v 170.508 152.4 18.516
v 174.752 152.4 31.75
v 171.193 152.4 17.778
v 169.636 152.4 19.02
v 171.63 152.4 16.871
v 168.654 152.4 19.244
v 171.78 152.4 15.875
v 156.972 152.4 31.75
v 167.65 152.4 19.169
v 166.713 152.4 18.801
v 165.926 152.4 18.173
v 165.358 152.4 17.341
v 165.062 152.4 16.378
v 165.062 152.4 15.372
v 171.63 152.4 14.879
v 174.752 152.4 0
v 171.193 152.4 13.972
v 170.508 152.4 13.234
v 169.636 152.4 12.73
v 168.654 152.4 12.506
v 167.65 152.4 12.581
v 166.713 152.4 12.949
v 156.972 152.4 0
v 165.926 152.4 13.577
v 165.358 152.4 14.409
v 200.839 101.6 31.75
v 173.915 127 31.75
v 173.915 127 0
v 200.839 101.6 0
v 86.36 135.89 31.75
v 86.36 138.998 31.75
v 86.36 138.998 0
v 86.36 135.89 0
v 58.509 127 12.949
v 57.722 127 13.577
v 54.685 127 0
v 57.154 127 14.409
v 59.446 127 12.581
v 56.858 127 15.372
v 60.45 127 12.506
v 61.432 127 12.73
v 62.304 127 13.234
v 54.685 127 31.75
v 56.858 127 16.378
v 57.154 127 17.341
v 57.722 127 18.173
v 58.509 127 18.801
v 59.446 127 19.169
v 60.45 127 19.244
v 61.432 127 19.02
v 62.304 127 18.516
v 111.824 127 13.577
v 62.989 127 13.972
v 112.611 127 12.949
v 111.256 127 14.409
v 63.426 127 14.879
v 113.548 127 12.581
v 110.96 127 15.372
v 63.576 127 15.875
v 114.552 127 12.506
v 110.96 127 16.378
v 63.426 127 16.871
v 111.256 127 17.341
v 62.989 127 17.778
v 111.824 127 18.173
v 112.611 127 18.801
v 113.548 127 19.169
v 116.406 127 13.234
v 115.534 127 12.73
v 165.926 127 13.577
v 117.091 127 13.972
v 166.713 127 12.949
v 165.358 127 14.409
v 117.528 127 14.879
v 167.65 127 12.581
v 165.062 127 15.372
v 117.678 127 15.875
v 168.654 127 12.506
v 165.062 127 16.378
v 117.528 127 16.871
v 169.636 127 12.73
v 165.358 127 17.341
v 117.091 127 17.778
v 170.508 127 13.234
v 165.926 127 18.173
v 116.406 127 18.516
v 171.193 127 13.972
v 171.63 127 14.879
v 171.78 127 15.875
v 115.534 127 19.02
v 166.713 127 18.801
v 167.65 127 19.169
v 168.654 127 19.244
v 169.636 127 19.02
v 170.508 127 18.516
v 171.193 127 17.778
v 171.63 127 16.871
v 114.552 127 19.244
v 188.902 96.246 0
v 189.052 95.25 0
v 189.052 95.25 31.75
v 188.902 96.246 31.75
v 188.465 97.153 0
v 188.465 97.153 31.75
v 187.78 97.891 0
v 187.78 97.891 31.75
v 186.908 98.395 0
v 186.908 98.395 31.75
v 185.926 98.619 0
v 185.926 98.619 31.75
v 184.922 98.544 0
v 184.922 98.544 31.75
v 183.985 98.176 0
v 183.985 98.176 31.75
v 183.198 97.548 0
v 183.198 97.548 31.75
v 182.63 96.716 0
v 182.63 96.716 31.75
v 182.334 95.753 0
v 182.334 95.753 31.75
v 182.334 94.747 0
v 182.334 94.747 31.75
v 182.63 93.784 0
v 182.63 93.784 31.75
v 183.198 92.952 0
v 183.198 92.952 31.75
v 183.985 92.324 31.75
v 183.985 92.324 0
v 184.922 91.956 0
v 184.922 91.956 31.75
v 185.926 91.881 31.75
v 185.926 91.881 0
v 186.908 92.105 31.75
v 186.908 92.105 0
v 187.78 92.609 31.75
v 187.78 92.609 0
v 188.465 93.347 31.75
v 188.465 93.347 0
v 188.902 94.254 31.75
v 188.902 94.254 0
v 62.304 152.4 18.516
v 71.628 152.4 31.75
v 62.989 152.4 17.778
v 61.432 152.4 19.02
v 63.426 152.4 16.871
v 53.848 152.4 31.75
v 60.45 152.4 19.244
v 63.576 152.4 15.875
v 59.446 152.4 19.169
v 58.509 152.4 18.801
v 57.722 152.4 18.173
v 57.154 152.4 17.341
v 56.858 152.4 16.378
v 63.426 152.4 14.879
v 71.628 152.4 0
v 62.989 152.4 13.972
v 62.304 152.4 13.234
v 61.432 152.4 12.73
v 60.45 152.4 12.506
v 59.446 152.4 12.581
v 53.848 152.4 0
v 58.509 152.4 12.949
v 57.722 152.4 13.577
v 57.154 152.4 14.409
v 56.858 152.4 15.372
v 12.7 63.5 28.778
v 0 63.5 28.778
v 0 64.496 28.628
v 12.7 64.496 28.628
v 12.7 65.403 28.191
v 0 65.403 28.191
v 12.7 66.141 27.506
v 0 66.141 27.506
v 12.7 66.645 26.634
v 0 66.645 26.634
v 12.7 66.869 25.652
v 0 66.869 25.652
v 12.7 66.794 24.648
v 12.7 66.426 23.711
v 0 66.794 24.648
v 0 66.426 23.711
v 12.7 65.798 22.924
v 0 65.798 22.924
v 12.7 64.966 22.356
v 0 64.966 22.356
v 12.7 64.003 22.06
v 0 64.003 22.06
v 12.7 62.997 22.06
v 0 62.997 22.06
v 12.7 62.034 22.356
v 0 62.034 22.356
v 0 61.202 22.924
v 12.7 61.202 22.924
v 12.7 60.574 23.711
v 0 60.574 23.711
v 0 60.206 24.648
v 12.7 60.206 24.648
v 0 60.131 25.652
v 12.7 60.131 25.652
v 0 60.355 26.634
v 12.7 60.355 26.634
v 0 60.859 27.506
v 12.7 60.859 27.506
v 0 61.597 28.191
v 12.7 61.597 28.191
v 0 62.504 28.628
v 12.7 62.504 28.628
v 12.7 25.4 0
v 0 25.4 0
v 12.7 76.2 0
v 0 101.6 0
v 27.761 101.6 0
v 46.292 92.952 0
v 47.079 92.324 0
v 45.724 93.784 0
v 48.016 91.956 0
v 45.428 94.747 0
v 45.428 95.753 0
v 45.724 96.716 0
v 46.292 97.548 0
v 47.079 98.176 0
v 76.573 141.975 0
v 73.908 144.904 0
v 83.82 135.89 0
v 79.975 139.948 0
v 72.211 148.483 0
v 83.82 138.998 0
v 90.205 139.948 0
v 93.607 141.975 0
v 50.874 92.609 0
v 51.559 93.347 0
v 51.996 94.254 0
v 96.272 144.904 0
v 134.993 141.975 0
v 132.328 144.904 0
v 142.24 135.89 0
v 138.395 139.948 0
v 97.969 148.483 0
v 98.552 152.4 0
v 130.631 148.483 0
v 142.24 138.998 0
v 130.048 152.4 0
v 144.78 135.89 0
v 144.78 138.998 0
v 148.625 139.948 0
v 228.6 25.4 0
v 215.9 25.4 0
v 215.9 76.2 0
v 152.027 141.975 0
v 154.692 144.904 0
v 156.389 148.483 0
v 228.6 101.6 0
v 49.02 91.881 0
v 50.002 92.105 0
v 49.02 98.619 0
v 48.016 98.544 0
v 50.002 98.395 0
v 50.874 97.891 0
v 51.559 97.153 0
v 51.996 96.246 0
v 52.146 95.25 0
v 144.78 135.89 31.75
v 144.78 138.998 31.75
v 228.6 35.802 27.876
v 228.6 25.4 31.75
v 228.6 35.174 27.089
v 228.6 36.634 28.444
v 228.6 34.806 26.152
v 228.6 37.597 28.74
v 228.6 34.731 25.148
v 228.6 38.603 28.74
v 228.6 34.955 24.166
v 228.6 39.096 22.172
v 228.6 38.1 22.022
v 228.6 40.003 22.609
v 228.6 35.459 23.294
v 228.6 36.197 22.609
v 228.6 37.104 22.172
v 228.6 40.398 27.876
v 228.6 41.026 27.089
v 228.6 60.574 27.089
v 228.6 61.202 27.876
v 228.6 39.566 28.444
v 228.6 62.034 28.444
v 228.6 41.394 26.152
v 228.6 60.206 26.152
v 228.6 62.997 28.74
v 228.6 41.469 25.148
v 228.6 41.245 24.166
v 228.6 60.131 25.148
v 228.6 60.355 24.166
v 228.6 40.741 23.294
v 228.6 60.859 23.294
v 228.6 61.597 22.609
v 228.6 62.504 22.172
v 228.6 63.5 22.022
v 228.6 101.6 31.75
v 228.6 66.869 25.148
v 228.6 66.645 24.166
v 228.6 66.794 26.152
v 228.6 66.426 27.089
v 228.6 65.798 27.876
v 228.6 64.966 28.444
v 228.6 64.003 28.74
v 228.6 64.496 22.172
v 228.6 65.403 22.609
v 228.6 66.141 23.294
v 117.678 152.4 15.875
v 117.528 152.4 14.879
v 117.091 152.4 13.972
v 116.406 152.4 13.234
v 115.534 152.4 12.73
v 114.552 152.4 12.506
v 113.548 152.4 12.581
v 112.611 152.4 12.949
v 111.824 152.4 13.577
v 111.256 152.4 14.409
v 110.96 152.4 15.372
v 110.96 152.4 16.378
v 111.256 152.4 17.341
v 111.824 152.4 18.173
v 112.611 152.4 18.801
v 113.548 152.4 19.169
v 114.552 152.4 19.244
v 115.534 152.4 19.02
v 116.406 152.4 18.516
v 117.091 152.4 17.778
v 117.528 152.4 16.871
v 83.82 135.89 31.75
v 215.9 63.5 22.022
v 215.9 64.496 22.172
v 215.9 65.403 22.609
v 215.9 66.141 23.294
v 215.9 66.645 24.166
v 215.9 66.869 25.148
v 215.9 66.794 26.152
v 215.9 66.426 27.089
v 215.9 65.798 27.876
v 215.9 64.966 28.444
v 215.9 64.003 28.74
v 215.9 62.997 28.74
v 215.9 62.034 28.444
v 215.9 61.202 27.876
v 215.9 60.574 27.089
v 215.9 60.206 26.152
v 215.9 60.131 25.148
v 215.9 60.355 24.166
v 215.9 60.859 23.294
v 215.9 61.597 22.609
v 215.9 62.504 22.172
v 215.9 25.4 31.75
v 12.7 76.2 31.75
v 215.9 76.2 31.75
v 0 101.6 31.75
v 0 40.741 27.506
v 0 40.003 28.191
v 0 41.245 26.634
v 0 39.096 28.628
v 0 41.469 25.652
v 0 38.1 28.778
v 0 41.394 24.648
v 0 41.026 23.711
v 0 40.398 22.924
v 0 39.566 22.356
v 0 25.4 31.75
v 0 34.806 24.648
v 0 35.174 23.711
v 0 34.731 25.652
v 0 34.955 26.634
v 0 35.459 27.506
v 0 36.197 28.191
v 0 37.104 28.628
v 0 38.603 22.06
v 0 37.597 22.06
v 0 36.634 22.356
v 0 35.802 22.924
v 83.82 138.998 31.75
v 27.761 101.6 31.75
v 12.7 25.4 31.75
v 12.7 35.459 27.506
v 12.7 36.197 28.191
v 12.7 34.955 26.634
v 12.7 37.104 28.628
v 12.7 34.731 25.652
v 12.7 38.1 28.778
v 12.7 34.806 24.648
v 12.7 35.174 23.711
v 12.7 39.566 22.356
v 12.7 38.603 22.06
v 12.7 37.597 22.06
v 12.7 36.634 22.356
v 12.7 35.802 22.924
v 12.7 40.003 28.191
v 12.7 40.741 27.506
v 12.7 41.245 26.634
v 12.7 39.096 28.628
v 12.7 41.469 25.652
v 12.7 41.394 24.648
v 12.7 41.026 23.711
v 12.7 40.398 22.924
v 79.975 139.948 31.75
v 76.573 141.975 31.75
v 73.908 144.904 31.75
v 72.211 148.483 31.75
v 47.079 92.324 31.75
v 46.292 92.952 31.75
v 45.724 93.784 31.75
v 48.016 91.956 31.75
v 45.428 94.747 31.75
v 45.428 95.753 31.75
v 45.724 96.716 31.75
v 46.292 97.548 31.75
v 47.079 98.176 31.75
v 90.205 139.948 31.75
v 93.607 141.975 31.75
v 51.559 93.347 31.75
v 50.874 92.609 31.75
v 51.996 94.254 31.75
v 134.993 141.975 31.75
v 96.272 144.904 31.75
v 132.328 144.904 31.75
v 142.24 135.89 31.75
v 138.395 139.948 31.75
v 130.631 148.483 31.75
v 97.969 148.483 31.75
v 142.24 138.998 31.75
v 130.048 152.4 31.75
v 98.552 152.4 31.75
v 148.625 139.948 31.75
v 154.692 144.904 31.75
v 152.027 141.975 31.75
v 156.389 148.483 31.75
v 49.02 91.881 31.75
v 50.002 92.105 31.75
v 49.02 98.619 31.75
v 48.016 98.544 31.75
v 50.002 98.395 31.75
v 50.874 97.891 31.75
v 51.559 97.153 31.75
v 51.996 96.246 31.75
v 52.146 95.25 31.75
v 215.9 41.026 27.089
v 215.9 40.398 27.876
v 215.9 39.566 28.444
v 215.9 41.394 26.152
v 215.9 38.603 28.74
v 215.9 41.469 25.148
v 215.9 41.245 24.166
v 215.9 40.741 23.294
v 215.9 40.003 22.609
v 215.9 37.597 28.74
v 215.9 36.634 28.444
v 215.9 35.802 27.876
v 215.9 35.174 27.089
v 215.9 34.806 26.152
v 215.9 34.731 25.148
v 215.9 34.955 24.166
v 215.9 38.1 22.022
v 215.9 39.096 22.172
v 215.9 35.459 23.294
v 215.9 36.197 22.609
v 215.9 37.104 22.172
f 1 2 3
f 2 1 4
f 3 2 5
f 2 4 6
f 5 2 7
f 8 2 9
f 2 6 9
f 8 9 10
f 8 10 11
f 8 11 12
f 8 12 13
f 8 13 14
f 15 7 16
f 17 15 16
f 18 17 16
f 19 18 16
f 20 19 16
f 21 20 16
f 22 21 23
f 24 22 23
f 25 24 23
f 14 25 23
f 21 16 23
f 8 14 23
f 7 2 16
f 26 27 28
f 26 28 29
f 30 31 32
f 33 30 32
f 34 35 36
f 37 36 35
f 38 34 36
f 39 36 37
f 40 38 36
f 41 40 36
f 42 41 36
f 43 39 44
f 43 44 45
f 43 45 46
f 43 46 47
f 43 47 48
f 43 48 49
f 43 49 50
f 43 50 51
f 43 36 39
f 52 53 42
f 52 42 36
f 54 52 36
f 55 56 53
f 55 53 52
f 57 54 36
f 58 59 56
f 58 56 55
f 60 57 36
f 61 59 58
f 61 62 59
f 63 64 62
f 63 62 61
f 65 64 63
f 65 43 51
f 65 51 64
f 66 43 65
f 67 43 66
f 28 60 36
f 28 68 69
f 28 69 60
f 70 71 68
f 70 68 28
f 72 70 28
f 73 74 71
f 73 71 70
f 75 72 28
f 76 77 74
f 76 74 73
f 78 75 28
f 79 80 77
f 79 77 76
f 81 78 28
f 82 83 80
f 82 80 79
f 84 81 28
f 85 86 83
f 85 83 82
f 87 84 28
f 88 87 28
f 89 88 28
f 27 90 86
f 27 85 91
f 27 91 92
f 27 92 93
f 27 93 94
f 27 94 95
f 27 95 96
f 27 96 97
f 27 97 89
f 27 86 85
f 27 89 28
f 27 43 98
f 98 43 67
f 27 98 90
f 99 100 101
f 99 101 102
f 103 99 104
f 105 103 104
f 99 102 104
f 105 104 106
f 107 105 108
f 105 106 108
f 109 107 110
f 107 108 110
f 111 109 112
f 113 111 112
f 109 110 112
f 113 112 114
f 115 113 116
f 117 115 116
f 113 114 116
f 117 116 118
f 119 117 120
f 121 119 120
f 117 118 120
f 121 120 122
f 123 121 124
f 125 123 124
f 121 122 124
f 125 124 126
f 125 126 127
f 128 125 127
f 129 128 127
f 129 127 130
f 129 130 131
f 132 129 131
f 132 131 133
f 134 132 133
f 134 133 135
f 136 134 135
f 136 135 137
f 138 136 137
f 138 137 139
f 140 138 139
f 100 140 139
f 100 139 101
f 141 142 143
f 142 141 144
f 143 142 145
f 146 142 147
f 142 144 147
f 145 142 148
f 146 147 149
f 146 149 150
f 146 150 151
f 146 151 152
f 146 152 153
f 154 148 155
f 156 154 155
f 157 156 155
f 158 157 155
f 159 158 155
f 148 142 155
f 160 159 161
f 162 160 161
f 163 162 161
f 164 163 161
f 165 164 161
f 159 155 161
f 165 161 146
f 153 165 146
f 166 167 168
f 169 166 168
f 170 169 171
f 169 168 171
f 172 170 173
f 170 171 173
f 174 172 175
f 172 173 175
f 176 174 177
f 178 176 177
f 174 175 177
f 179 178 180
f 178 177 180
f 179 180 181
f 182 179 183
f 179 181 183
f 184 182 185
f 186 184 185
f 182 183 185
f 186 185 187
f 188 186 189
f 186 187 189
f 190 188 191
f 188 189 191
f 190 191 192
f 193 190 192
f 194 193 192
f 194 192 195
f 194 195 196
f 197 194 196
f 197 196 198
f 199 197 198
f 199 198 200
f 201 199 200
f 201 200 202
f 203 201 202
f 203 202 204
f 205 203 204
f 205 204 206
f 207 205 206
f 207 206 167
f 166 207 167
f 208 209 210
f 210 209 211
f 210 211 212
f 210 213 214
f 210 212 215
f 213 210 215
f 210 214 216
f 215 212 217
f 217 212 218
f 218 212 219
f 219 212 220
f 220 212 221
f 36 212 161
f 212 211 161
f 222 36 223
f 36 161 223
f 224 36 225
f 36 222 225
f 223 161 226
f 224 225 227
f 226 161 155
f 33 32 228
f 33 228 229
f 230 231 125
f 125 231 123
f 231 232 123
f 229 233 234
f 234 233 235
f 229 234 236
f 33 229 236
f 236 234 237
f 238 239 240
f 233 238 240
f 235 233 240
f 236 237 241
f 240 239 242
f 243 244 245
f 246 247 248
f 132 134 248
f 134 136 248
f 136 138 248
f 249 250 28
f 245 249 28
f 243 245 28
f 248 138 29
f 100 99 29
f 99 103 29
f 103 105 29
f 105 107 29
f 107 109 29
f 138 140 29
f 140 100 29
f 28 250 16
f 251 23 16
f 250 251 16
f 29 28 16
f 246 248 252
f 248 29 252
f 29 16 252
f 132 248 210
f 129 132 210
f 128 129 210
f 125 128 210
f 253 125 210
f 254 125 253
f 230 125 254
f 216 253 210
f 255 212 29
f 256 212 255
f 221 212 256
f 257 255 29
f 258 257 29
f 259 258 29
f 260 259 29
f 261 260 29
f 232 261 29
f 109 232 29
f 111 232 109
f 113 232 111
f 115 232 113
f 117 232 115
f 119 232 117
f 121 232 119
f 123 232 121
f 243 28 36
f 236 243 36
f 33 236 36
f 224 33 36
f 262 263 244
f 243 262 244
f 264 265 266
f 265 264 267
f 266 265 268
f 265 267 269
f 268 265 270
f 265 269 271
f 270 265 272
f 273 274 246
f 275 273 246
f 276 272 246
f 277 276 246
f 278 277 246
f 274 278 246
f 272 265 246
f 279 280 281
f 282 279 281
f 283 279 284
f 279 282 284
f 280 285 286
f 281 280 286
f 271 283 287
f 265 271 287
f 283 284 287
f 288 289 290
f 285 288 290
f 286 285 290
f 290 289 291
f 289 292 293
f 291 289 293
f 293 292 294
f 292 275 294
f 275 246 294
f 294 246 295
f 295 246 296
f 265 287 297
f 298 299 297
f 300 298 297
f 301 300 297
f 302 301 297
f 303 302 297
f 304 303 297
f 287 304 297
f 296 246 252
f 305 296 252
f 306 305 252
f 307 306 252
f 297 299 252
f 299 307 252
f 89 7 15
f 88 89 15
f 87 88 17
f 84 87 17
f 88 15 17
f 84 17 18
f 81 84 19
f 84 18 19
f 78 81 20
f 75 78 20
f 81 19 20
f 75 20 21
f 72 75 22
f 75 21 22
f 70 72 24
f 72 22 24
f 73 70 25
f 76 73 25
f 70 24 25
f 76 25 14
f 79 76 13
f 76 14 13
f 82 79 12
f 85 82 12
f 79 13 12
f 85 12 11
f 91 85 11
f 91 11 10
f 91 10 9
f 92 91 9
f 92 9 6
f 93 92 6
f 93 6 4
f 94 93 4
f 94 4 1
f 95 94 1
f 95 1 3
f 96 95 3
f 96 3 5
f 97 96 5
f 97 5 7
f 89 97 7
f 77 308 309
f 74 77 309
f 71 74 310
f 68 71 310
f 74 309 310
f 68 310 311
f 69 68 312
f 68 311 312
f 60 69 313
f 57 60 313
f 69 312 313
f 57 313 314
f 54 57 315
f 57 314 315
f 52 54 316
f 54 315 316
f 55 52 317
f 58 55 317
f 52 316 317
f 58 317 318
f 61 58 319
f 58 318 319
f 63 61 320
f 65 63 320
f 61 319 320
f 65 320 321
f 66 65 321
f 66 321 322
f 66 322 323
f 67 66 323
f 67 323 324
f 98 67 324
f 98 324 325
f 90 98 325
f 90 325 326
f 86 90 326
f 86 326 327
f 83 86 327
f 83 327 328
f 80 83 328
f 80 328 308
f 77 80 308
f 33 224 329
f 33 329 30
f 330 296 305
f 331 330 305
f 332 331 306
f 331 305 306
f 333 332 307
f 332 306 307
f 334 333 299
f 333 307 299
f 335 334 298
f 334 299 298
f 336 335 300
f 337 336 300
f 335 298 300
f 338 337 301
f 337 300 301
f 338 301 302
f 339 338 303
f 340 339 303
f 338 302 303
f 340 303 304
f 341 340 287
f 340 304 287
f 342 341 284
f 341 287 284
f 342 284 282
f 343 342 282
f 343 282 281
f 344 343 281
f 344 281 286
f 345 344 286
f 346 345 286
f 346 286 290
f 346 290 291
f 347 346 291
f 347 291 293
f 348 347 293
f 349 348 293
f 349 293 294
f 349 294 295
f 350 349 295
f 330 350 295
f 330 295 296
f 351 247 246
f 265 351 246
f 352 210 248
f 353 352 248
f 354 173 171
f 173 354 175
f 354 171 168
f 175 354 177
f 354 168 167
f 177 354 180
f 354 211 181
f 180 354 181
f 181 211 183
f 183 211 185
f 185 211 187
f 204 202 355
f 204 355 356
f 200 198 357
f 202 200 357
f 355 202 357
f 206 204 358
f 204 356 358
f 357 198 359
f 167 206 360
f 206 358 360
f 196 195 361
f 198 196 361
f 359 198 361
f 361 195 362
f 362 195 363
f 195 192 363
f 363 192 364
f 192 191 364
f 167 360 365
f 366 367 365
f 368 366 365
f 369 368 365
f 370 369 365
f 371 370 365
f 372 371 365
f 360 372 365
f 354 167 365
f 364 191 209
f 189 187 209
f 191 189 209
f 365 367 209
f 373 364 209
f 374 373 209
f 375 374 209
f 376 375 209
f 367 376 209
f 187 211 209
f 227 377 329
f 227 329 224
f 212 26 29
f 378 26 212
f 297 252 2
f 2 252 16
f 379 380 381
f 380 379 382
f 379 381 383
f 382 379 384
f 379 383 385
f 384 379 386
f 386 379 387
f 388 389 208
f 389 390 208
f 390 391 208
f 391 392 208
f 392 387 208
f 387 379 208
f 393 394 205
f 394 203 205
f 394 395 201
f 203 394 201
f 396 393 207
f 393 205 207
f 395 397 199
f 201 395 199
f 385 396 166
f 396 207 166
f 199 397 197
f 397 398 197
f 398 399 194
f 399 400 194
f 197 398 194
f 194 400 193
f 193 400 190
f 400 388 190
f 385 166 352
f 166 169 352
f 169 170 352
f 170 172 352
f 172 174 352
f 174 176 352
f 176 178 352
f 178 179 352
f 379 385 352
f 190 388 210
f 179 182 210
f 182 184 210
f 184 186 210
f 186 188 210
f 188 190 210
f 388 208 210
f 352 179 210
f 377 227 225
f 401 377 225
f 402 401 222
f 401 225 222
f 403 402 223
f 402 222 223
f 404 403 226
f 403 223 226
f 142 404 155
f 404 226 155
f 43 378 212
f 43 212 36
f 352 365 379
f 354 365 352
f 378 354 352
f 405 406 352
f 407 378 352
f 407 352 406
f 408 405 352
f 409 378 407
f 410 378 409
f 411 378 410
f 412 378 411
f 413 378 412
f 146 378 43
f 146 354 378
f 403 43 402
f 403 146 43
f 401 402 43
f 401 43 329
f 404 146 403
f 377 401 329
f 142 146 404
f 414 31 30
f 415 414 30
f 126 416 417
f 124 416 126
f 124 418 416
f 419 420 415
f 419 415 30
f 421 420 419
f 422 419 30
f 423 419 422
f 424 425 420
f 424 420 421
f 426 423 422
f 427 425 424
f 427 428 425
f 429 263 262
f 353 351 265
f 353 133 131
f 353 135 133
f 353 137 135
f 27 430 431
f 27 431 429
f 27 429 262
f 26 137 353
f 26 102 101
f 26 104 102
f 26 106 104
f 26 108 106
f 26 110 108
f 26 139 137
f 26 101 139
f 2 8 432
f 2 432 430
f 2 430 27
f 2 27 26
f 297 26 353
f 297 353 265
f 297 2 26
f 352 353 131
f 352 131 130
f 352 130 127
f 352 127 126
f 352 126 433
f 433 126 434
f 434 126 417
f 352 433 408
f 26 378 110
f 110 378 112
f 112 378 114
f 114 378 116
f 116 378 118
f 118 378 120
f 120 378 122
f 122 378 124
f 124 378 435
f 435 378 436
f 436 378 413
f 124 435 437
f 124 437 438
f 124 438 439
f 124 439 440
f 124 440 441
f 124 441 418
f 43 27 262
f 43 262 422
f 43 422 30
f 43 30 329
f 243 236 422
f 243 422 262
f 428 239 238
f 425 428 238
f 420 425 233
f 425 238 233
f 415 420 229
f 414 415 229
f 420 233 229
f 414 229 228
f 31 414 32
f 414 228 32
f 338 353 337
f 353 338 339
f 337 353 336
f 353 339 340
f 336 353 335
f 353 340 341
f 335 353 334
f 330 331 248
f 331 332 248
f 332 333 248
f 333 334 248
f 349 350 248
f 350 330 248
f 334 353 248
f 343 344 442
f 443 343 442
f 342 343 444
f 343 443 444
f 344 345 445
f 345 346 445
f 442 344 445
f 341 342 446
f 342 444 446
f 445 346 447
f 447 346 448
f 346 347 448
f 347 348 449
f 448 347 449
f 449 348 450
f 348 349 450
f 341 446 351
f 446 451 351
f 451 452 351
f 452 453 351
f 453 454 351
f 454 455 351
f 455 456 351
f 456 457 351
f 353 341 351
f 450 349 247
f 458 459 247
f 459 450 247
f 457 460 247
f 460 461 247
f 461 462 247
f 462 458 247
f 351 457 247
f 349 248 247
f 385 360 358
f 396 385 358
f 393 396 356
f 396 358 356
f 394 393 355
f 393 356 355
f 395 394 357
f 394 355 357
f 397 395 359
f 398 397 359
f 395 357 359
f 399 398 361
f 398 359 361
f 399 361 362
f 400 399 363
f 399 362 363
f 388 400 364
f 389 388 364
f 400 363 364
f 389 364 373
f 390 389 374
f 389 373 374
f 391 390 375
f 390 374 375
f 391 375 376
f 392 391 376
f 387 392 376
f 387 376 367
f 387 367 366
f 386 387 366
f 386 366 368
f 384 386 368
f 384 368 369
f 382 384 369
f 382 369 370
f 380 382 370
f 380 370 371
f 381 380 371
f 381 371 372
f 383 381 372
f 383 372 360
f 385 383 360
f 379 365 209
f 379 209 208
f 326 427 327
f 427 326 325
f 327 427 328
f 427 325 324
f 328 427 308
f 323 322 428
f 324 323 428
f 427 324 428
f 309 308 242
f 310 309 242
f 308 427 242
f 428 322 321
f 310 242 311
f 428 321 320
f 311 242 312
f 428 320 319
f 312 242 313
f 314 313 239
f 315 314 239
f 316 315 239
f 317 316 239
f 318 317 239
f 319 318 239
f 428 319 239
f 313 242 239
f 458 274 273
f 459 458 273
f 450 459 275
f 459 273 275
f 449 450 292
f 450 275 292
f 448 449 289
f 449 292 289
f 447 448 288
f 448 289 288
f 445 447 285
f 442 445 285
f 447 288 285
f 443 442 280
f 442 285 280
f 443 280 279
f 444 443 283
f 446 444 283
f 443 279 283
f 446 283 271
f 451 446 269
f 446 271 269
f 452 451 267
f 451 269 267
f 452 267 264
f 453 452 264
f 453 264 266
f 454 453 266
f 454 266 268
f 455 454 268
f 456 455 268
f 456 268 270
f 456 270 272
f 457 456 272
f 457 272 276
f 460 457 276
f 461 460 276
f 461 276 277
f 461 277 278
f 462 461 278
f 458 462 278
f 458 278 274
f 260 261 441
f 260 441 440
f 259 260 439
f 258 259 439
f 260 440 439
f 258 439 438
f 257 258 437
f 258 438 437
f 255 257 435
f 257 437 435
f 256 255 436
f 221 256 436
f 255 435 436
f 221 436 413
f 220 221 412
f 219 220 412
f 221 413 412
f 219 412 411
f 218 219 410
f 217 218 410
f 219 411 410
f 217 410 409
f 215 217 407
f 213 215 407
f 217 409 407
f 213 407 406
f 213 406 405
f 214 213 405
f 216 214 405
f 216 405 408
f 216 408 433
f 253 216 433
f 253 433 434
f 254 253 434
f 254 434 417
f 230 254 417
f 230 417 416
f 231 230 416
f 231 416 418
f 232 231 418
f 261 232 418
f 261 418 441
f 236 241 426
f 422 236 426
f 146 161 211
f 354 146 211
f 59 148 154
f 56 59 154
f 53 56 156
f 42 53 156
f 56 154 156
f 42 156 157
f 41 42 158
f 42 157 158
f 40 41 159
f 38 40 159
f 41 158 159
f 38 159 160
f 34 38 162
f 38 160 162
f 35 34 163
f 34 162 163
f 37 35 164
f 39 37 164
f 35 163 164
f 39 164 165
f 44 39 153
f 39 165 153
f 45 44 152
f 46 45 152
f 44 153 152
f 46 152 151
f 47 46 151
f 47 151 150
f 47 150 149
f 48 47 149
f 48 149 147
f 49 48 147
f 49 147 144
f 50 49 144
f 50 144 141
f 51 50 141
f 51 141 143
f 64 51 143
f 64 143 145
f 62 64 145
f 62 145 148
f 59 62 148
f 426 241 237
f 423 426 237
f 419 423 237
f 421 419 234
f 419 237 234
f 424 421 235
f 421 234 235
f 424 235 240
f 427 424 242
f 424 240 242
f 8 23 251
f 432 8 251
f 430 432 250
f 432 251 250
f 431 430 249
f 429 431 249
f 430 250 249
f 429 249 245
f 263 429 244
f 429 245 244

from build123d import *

# Parameters (mm, degrees)
BOSS_EXTRUDE1_DEPTH = 50.8
SKETCH3_R           = 3.3782
CUT_EXTRUDE1_DEPTH  = 25.4
SKETCH4_R           = 3.3782
CUT_EXTRUDE2_DEPTH  = 25.4
SKETCH7_W           = 228.6
SKETCH7_H           = 152.4
CUT_EXTRUDE5_DEPTH  = 19.05
SKETCH8_W           = 228.6
SKETCH8_H           = 25.4
CUT_EXTRUDE6_DEPTH  = 39.37
SKETCH9_R           = 3.3782
CUT_EXTRUDE7_DEPTH  = 27.94
CUT_EXTRUDE8_DEPTH  = 40.64
SKETCH12_W          = 1.27
SKETCH12_H          = 31.75
CUT_EXTRUDE9_DEPTH  = 16.51
CUT_EXTRUDE10_REACH = 33.75
SKETCH13_R          = 3.3782


with BuildPart() as part:
    # Sketch2 → Boss-Extrude1 (new body)
    with BuildSketch(Plane.XY):
        with BuildLine():
            Line((215.9, 0), (228.6, 0))
            Line((228.6, 0), (228.6, 101.6))
            Line((228.6, 101.6), (174.752, 152.4))
            Line((174.752, 152.4), (156.972, 152.4))
            ThreePointArc((156.972, 152.4), (143.51, 138.938), (130.048, 152.4))
            Line((130.048, 152.4), (98.552, 152.4))
            ThreePointArc((98.552, 152.4), (85.09, 138.938), (71.628, 152.4))
            Line((71.628, 152.4), (53.848, 152.4))
            Line((53.848, 152.4), (0, 101.6))
            Line((0, 101.6), (0, 0))
            Line((0, 0), (12.7, 0))
            Line((12.7, 0), (12.7, 76.2))
            Line((12.7, 76.2), (215.9, 76.2))
            Line((215.9, 76.2), (215.9, 0))
        make_face()
    extrude(amount=BOSS_EXTRUDE1_DEPTH)

    # Sketch3 → Cut-Extrude1 (cut)
    with BuildSketch(Plane.ZY):
        with Locations((25.4, 63.5)):
            Circle(SKETCH3_R)
        with Locations((25.4, 38.1)):
            Circle(SKETCH3_R)
    extrude(amount=-CUT_EXTRUDE1_DEPTH, mode=Mode.SUBTRACT)

    # Sketch4 → Cut-Extrude2 (cut)
    with BuildSketch(Plane(origin=(228.6, 0, 0), x_dir=(0, 0, -1), z_dir=(1, 0, 0))):
        with Locations((-25.4, 63.5)):
            Circle(SKETCH4_R)
        with Locations((-25.4, 38.1)):
            Circle(SKETCH4_R)
    extrude(amount=-CUT_EXTRUDE2_DEPTH, mode=Mode.SUBTRACT)

    # Sketch7 → Cut-Extrude5 (cut)
    with BuildSketch(Plane.XY.offset(50.8)):
        with Locations((114.3, 76.2)):
            Rectangle(SKETCH7_W, SKETCH7_H)
    extrude(amount=-CUT_EXTRUDE5_DEPTH, mode=Mode.SUBTRACT)

    # Sketch8 → Cut-Extrude6 (cut)
    with BuildSketch(Plane.XY.offset(31.75)):
        with Locations((114.3, 12.7)):
            Rectangle(SKETCH8_W, SKETCH8_H)
    extrude(amount=-CUT_EXTRUDE6_DEPTH, mode=Mode.SUBTRACT)

    # Sketch9 → Cut-Extrude7 (cut)
    with BuildSketch(Plane(origin=(0, 152.4, 0), x_dir=(1, 0, 0), z_dir=(0, 1, 0))):
        with Locations((60.198, -15.875)):
            Circle(SKETCH9_R)
        with Locations((114.3, -15.875)):
            Circle(SKETCH9_R)
        with Locations((168.402, -15.875)):
            Circle(SKETCH9_R)
    extrude(amount=-CUT_EXTRUDE7_DEPTH, mode=Mode.SUBTRACT)

    # Sketch10 → Cut-Extrude8 (cut)
    with BuildSketch(Plane.XY.offset(31.75)):
        Polygon((27.760759157, 101.6), (54.684759157, 127), (173.915240843, 127), (200.839240843, 101.6), align=None)
    extrude(amount=-CUT_EXTRUDE8_DEPTH, mode=Mode.SUBTRACT)

    # Sketch12 → Cut-Extrude9 (cut)
    with BuildSketch(Plane(origin=(0, 152.4, 0), x_dir=(1, 0, 0), z_dir=(0, 1, 0))):
        with Locations((85.725, -15.875)):
            Rectangle(SKETCH12_W, SKETCH12_H)
        with Locations((84.455, -15.875)):
            Rectangle(SKETCH12_W, SKETCH12_H)
        Polygon((143.51, 0), (142.24, 0), (142.24, -31.75), (144.78, -31.75), (144.78, 0), align=None)
    extrude(amount=-CUT_EXTRUDE9_DEPTH, mode=Mode.SUBTRACT)

    # Sketch13 → Cut-Extrude10 (cut, up to next)
    with BuildSketch(Plane.XY.offset(31.75), mode=Mode.PRIVATE) as cut_extrude10_sk1:
        with Locations((48.768, 95.25)):
            Circle(SKETCH13_R)
    cut_extrude10_tool1 = extrude(cut_extrude10_sk1.sketch, amount=-CUT_EXTRUDE10_REACH, mode=Mode.PRIVATE) & part.part
    add(cut_extrude10_tool1.solids().sort_by_distance((48.768, 95.25, 31.75))[0], mode=Mode.SUBTRACT)
    # Sketch13 → Cut-Extrude10 (cut, up to next)
    with BuildSketch(Plane.XY.offset(31.75), mode=Mode.PRIVATE) as cut_extrude10_sk2:
        with Locations((185.674, 95.25)):
            Circle(SKETCH13_R)
    cut_extrude10_tool2 = extrude(cut_extrude10_sk2.sketch, amount=-CUT_EXTRUDE10_REACH, mode=Mode.PRIVATE) & part.part
    add(cut_extrude10_tool2.solids().sort_by_distance((185.674, 95.25, 31.75))[0], mode=Mode.SUBTRACT)


solid = part.part
